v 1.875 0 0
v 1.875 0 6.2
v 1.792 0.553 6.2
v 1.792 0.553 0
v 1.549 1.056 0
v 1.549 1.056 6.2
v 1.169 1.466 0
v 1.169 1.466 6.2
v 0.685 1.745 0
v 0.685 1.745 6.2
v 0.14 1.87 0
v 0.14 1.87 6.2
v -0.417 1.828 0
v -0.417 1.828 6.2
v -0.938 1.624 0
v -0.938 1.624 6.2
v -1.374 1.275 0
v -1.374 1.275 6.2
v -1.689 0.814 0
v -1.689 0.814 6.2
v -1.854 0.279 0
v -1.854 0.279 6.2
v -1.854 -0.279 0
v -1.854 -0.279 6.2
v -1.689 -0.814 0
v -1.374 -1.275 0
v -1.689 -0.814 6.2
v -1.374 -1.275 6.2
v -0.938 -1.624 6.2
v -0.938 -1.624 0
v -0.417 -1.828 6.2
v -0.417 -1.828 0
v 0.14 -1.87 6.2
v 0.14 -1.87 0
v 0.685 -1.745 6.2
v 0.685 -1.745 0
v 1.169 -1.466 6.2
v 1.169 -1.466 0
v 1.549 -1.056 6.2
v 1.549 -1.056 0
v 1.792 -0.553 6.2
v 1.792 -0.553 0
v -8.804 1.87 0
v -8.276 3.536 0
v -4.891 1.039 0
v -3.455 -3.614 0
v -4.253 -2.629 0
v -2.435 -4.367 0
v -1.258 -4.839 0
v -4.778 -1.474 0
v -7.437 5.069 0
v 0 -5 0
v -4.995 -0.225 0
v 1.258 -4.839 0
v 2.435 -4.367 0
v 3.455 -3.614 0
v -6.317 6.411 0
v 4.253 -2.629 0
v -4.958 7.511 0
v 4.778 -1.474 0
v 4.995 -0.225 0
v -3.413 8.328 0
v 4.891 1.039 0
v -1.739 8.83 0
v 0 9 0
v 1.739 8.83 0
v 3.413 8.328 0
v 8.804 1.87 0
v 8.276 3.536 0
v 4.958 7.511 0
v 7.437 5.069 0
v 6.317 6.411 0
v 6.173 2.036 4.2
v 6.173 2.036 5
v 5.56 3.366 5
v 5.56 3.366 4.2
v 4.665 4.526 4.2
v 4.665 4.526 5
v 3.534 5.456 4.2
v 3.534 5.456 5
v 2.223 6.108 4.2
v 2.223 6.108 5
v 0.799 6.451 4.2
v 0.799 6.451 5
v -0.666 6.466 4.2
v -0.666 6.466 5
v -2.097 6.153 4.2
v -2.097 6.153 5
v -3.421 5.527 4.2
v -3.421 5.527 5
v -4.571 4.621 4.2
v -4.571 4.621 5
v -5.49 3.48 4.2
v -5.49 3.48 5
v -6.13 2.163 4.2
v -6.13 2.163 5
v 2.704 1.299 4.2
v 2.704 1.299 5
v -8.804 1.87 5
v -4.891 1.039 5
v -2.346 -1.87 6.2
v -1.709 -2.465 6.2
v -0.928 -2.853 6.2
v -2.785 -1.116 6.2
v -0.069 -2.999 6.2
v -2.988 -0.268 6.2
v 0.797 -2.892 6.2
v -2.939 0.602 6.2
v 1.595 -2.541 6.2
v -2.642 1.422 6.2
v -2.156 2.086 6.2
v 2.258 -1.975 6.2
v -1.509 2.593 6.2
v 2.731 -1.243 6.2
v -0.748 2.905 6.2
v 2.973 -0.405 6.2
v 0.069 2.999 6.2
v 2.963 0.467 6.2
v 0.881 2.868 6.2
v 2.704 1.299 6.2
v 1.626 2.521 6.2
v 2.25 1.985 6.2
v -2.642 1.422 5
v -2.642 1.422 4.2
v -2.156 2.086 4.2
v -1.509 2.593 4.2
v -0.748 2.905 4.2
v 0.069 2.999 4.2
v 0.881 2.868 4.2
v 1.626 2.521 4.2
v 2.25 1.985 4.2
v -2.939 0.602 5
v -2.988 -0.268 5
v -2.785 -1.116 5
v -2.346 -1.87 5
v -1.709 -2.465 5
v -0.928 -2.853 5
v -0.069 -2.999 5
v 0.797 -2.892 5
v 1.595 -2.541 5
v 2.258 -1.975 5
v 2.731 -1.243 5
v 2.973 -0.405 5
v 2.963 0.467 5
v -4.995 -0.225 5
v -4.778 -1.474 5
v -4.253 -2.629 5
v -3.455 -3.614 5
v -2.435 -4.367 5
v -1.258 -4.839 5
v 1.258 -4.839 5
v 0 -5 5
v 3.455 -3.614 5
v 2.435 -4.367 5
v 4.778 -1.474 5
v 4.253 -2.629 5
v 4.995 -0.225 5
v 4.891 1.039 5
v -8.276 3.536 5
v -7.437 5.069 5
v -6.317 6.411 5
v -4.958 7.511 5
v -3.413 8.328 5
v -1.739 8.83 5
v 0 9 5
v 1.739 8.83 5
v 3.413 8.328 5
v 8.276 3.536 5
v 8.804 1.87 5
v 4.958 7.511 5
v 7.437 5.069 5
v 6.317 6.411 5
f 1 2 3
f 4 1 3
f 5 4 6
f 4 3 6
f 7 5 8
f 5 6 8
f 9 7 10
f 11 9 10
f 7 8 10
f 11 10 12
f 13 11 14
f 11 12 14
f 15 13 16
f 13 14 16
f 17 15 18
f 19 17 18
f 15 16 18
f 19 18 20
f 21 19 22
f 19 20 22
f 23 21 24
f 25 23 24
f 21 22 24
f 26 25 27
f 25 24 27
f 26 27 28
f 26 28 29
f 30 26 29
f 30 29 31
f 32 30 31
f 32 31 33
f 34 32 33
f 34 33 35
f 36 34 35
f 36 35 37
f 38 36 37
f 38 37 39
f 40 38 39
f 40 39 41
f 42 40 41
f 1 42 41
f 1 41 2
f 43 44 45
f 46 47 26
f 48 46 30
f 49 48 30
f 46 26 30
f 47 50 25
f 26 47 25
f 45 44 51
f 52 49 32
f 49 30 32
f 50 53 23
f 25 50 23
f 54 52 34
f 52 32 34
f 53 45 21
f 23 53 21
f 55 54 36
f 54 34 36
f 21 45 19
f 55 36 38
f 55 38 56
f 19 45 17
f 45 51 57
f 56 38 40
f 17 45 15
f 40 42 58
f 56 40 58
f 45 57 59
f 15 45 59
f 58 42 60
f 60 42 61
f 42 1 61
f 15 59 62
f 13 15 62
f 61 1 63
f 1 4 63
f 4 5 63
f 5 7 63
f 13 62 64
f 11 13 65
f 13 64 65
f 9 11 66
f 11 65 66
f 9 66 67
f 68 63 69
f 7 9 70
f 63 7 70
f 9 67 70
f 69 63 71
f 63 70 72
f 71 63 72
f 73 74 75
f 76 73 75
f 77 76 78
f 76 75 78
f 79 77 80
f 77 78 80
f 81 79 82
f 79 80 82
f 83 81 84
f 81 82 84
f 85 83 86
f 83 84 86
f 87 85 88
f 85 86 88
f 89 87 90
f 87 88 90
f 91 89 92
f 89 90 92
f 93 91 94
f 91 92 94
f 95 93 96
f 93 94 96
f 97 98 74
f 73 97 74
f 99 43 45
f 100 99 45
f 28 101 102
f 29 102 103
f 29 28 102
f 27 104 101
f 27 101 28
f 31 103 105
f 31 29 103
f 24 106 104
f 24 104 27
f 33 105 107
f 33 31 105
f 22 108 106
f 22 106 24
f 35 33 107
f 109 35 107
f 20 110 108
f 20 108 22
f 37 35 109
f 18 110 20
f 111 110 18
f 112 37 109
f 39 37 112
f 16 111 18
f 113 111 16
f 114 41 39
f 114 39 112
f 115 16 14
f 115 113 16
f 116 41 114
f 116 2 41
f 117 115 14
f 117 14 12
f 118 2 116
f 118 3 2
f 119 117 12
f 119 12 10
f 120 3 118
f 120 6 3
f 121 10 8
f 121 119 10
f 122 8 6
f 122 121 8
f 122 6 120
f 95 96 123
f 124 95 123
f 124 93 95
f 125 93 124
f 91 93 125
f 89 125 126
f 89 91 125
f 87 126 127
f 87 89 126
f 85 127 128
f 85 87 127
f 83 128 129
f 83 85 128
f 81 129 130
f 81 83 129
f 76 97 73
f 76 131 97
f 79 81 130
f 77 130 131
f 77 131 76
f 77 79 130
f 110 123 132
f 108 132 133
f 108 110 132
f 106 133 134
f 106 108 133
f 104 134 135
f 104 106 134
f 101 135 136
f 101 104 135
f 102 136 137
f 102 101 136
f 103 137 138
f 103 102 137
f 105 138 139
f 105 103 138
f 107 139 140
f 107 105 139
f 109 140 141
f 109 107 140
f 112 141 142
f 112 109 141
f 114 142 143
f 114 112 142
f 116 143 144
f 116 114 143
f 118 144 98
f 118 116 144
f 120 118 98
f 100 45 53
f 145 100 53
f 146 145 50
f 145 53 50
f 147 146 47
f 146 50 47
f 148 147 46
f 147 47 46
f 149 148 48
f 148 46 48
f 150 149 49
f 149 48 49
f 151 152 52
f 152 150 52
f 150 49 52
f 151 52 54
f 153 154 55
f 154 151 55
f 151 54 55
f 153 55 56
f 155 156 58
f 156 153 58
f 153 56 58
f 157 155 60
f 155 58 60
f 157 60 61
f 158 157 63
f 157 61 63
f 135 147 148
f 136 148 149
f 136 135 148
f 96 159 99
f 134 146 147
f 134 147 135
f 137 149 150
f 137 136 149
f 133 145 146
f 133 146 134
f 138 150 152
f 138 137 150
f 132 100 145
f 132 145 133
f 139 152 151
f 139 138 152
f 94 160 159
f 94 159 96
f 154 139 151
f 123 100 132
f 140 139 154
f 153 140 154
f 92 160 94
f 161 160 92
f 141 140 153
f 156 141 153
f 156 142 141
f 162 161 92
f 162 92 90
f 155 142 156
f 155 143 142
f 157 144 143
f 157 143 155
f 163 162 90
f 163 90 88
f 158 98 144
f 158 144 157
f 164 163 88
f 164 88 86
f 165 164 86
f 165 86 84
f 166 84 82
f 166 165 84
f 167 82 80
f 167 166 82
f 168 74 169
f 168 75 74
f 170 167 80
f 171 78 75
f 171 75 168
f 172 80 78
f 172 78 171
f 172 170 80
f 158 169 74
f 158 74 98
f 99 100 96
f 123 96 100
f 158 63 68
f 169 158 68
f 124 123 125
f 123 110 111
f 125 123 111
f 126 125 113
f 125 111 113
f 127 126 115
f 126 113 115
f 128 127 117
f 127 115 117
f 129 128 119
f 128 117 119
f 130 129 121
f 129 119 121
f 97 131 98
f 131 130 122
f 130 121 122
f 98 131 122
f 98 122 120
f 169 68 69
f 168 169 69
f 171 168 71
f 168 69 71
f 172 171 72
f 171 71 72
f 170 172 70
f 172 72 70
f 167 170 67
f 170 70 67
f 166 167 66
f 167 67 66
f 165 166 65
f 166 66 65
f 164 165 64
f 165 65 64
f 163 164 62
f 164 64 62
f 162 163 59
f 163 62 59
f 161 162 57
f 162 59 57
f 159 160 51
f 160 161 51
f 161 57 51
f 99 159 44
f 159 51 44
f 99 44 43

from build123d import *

# Parameters (mm, degrees)
BOSS_EXTRUDE3_DEPTH = 6.2
SKETCH3_2_R         = 1.875
CUT_EXTRUDE2_DEPTH  = 10
CUT_EXTRUDE3_DEPTH  = 2
SKETCH5_R           = 10.344131343
SKETCH5_R_2         = 3
CUT_EXTRUDE4_DEPTH  = 1.2


with BuildPart() as part:
    # Sketch1 → Boss-Extrude3 (new body)
    with BuildSketch(Plane.XY):
        with BuildLine():
            Line((-8.803520999, 1.870298914), (-4.890844999, 1.039054952))
            ThreePointArc((-4.890844999, 1.039054952), (0, -5), (4.890844999, 1.039054952))
            Line((4.890844999, 1.039054952), (8.803520999, 1.870298914))
            ThreePointArc((8.803520999, 1.870298914), (0, 9), (-8.803520999, 1.870298914))
        make_face()
    extrude(amount=BOSS_EXTRUDE3_DEPTH)

    # Sketch3<2> → Cut-Extrude2 (cut)
    with BuildSketch(Plane.XY.offset(6.2)):
        Circle(SKETCH3_2_R)
    extrude(amount=-CUT_EXTRUDE2_DEPTH, mode=Mode.SUBTRACT)

    # Sketch4 → Cut-Extrude3 (cut)
    with BuildSketch(Plane.XY.offset(6.2)):
        with BuildLine():
            Line((2.704066688, 1.299239525), (6.172842293, 2.036177308))
            ThreePointArc((6.172842293, 2.036177308), (0.066834303, 6.499656389), (-6.129666509, 2.162680856))
            Line((-6.129666509, 2.162680856), (-2.641748736, 1.42167634))
            ThreePointArc((-2.641748736, 1.42167634), (0.068691886, 2.999213468), (2.704066688, 1.299239525))
        make_face()
    extrude(amount=-CUT_EXTRUDE3_DEPTH, mode=Mode.SUBTRACT)

    # Sketch5 → Cut-Extrude4 (cut)
    with BuildSketch(Plane.XY.offset(6.2)):
        Circle(SKETCH5_R)
        Circle(SKETCH5_R_2, mode=Mode.SUBTRACT)
    extrude(amount=-CUT_EXTRUDE4_DEPTH, mode=Mode.SUBTRACT)


solid = part.part
